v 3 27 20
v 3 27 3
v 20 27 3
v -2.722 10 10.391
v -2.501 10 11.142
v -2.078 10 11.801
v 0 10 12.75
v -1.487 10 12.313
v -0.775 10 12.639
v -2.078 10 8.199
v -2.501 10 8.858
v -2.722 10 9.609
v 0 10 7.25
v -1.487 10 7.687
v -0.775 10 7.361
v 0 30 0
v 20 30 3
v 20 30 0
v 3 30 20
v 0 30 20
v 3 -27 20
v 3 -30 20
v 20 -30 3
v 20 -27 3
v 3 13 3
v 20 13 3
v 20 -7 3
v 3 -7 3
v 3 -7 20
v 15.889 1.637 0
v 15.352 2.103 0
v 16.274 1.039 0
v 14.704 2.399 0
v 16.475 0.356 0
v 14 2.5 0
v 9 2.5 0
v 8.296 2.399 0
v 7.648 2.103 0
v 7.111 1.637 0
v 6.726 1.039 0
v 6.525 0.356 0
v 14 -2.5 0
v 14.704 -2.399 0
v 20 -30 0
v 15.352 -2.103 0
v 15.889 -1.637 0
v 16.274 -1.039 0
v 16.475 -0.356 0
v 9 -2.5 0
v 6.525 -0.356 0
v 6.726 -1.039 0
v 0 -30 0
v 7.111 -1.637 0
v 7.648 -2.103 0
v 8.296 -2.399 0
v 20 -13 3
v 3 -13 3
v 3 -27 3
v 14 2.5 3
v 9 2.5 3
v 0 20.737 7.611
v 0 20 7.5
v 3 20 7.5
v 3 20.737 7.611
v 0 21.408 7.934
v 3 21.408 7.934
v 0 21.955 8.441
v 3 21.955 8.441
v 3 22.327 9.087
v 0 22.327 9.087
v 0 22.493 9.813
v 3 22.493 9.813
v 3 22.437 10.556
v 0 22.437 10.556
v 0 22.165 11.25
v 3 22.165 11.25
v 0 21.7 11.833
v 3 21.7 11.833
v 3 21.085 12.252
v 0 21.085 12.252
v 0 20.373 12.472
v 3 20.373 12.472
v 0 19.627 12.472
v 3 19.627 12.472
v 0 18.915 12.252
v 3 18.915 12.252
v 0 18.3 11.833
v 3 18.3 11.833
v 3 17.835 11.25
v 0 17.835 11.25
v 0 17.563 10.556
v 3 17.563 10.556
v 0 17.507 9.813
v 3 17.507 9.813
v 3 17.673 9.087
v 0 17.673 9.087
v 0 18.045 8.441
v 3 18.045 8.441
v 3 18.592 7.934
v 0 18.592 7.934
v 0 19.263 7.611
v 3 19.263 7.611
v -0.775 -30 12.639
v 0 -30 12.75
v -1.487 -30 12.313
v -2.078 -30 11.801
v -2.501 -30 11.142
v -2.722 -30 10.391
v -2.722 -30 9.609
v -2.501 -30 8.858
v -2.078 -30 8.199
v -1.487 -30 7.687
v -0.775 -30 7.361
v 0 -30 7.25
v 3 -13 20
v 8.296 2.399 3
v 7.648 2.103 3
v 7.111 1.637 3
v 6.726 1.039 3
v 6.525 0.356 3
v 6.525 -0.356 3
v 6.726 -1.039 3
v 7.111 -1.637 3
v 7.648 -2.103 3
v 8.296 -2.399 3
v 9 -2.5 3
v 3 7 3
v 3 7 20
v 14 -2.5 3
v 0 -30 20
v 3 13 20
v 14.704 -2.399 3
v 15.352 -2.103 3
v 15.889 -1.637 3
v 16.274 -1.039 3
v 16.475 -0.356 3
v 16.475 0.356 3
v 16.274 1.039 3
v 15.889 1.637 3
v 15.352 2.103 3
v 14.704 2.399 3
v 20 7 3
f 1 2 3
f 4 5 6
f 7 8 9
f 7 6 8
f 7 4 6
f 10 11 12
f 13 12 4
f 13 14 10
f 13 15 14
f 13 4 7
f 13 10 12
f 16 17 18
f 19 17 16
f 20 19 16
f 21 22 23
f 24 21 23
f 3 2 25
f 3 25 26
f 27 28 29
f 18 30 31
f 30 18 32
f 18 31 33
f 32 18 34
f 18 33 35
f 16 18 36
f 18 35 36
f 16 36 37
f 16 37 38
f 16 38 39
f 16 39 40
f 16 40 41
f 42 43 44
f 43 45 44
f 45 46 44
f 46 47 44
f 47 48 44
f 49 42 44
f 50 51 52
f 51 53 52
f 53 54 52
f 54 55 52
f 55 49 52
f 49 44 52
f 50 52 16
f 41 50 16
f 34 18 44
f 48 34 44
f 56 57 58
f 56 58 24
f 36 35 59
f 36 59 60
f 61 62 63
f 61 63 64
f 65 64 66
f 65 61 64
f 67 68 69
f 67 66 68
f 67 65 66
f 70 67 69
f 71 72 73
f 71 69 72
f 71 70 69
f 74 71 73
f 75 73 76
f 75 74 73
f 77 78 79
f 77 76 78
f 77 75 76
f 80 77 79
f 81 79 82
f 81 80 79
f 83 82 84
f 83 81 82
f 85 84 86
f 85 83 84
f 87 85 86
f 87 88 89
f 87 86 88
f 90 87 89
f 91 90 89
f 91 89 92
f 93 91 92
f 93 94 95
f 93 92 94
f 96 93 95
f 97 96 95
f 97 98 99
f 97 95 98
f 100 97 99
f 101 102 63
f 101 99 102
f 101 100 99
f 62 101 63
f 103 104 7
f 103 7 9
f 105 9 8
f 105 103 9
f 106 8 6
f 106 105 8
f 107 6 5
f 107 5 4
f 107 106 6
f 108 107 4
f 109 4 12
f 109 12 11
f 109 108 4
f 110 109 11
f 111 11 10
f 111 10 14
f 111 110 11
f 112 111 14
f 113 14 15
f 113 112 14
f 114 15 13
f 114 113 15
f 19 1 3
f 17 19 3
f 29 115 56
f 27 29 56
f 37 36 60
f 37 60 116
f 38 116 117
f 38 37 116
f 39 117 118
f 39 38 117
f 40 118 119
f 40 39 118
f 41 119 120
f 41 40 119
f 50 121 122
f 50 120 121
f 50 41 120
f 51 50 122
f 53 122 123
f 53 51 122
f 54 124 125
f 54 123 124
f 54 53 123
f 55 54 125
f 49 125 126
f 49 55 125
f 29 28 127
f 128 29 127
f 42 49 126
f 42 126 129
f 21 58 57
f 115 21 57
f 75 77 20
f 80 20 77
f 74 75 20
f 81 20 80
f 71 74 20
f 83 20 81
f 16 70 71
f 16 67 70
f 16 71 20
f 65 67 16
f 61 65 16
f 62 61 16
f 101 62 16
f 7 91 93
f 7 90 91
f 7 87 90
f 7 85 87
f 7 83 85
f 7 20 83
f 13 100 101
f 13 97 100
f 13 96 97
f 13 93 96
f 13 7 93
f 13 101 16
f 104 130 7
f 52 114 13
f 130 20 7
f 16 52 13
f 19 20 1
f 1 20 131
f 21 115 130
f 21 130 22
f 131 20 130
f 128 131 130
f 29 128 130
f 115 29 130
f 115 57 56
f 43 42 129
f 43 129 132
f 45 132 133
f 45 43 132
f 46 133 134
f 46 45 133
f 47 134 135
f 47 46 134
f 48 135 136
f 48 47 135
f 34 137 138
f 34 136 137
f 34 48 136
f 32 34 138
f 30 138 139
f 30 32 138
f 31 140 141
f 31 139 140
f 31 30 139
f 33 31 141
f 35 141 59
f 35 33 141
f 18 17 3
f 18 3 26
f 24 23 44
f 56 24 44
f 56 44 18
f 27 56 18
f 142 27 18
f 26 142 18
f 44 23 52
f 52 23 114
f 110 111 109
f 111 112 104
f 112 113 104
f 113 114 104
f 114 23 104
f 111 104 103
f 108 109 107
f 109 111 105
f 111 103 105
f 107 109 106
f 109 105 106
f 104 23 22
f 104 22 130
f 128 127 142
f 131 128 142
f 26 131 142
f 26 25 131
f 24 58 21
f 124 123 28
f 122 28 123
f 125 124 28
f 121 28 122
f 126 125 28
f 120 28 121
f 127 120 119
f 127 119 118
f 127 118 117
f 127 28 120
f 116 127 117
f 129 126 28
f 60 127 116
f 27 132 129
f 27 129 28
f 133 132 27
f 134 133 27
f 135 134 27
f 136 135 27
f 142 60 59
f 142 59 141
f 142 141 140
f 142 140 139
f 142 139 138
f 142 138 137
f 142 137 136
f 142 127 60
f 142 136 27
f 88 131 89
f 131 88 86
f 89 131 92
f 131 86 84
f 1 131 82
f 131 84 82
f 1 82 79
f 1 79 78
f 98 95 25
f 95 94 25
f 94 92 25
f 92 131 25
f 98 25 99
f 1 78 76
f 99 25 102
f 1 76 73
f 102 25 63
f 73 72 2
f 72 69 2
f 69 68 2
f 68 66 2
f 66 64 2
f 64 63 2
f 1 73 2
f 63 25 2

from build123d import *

# Parameters (mm, degrees)
BOX_W            = 20
BOX_H            = 20
BOX_DEPTH        = 20
EXTRUDE001_DEPTH = 50
CYLINDER_R       = 2.5
CYLINDER_DEPTH   = 10
BOX001_W         = 20
BOX001_H         = 14
BOX001_DEPTH     = 20
ARRAY_Y_COUNT    = 3
ARRAY_Y_PITCH    = 20
EXTRUDE_DEPTH    = 30


with BuildPart() as bolt_item_cube_cutter:
    # Box → Box (new body)
    with BuildSketch(Plane(origin=(-20, 10, 0), x_dir=(1, 0, 0), z_dir=(0, 0, 1))):
        with Locations((10, 10)):
            Rectangle(BOX_W, BOX_H)
    extrude(amount=BOX_DEPTH)


with BuildPart() as bottom_bolt_hole_extrude:
    # Sketch001 → Extrude001 (new body)
    with BuildSketch(Plane.XY):
        with BuildLine():
            ThreePointArc((-2.5, 2.5), (-5, 0), (-2.5, -2.5))
            Line((-2.5, -2.5), (2.5, -2.5))
            ThreePointArc((2.5, -2.5), (5, 0), (2.5, 2.5))
            Line((2.5, 2.5), (-2.5, 2.5))
        make_face()
    extrude(amount=EXTRUDE001_DEPTH)


with BuildPart() as bottom_bolt_hole_extrude_1:
    # Extrude001 placement: moved
    add(bottom_bolt_hole_extrude.part.moved(Location((11.5, 0, 0))))


with BuildPart() as bolt_hole:
    # Cylinder → Cylinder (new body)
    with BuildSketch(Plane(origin=(-5, 20, 10), x_dir=(0, 0, -1), z_dir=(1, 0, 0))):
        Circle(CYLINDER_R)
    extrude(amount=CYLINDER_DEPTH)


with BuildPart() as leg_extract:
    # Box001 → Box001 (new body)
    with BuildSketch(Plane(origin=(3, -27, 3), x_dir=(1, 0, 0), z_dir=(0, 0, 1))):
        with Locations((10, 7)):
            Rectangle(BOX001_W, BOX001_H)
    extrude(amount=BOX001_DEPTH)

    # Array Y: leg extract ×3


with BuildPart() as leg_extract_1:
    add(leg_extract.part)
    with Locations(*[(0, i * ARRAY_Y_PITCH, 0) for i in range(1, ARRAY_Y_COUNT)]):
        add(leg_extract.part)

    # Fusion: union bolt item cube cutter, bottom bolt hole extrude, bolt hole
    add(bolt_item_cube_cutter.part)
    add(bottom_bolt_hole_extrude_1.part)
    add(bolt_hole.part)


with BuildPart() as leg_cut:
    # Sketch → Extrude (new body, symmetric)
    with BuildSketch(Plane.XZ):
        with BuildLine():
            Line((0, 20), (3, 20))
            Line((3, 20), (20, 3))
            Line((20, 3), (20, 0))
            Line((20, 0), (0, 0))
            Line((0, 0), (0, 7.25))
            ThreePointArc((0, 12.75), (-2.75, 10), (0, 7.25))
            Line((0, 20), (0, 12.75))
        make_face()
    extrude(amount=EXTRUDE_DEPTH, both=True)

    # Cut: cut leg extract
    add(leg_extract_1.part, mode=Mode.SUBTRACT)


solid = leg_cut.part
